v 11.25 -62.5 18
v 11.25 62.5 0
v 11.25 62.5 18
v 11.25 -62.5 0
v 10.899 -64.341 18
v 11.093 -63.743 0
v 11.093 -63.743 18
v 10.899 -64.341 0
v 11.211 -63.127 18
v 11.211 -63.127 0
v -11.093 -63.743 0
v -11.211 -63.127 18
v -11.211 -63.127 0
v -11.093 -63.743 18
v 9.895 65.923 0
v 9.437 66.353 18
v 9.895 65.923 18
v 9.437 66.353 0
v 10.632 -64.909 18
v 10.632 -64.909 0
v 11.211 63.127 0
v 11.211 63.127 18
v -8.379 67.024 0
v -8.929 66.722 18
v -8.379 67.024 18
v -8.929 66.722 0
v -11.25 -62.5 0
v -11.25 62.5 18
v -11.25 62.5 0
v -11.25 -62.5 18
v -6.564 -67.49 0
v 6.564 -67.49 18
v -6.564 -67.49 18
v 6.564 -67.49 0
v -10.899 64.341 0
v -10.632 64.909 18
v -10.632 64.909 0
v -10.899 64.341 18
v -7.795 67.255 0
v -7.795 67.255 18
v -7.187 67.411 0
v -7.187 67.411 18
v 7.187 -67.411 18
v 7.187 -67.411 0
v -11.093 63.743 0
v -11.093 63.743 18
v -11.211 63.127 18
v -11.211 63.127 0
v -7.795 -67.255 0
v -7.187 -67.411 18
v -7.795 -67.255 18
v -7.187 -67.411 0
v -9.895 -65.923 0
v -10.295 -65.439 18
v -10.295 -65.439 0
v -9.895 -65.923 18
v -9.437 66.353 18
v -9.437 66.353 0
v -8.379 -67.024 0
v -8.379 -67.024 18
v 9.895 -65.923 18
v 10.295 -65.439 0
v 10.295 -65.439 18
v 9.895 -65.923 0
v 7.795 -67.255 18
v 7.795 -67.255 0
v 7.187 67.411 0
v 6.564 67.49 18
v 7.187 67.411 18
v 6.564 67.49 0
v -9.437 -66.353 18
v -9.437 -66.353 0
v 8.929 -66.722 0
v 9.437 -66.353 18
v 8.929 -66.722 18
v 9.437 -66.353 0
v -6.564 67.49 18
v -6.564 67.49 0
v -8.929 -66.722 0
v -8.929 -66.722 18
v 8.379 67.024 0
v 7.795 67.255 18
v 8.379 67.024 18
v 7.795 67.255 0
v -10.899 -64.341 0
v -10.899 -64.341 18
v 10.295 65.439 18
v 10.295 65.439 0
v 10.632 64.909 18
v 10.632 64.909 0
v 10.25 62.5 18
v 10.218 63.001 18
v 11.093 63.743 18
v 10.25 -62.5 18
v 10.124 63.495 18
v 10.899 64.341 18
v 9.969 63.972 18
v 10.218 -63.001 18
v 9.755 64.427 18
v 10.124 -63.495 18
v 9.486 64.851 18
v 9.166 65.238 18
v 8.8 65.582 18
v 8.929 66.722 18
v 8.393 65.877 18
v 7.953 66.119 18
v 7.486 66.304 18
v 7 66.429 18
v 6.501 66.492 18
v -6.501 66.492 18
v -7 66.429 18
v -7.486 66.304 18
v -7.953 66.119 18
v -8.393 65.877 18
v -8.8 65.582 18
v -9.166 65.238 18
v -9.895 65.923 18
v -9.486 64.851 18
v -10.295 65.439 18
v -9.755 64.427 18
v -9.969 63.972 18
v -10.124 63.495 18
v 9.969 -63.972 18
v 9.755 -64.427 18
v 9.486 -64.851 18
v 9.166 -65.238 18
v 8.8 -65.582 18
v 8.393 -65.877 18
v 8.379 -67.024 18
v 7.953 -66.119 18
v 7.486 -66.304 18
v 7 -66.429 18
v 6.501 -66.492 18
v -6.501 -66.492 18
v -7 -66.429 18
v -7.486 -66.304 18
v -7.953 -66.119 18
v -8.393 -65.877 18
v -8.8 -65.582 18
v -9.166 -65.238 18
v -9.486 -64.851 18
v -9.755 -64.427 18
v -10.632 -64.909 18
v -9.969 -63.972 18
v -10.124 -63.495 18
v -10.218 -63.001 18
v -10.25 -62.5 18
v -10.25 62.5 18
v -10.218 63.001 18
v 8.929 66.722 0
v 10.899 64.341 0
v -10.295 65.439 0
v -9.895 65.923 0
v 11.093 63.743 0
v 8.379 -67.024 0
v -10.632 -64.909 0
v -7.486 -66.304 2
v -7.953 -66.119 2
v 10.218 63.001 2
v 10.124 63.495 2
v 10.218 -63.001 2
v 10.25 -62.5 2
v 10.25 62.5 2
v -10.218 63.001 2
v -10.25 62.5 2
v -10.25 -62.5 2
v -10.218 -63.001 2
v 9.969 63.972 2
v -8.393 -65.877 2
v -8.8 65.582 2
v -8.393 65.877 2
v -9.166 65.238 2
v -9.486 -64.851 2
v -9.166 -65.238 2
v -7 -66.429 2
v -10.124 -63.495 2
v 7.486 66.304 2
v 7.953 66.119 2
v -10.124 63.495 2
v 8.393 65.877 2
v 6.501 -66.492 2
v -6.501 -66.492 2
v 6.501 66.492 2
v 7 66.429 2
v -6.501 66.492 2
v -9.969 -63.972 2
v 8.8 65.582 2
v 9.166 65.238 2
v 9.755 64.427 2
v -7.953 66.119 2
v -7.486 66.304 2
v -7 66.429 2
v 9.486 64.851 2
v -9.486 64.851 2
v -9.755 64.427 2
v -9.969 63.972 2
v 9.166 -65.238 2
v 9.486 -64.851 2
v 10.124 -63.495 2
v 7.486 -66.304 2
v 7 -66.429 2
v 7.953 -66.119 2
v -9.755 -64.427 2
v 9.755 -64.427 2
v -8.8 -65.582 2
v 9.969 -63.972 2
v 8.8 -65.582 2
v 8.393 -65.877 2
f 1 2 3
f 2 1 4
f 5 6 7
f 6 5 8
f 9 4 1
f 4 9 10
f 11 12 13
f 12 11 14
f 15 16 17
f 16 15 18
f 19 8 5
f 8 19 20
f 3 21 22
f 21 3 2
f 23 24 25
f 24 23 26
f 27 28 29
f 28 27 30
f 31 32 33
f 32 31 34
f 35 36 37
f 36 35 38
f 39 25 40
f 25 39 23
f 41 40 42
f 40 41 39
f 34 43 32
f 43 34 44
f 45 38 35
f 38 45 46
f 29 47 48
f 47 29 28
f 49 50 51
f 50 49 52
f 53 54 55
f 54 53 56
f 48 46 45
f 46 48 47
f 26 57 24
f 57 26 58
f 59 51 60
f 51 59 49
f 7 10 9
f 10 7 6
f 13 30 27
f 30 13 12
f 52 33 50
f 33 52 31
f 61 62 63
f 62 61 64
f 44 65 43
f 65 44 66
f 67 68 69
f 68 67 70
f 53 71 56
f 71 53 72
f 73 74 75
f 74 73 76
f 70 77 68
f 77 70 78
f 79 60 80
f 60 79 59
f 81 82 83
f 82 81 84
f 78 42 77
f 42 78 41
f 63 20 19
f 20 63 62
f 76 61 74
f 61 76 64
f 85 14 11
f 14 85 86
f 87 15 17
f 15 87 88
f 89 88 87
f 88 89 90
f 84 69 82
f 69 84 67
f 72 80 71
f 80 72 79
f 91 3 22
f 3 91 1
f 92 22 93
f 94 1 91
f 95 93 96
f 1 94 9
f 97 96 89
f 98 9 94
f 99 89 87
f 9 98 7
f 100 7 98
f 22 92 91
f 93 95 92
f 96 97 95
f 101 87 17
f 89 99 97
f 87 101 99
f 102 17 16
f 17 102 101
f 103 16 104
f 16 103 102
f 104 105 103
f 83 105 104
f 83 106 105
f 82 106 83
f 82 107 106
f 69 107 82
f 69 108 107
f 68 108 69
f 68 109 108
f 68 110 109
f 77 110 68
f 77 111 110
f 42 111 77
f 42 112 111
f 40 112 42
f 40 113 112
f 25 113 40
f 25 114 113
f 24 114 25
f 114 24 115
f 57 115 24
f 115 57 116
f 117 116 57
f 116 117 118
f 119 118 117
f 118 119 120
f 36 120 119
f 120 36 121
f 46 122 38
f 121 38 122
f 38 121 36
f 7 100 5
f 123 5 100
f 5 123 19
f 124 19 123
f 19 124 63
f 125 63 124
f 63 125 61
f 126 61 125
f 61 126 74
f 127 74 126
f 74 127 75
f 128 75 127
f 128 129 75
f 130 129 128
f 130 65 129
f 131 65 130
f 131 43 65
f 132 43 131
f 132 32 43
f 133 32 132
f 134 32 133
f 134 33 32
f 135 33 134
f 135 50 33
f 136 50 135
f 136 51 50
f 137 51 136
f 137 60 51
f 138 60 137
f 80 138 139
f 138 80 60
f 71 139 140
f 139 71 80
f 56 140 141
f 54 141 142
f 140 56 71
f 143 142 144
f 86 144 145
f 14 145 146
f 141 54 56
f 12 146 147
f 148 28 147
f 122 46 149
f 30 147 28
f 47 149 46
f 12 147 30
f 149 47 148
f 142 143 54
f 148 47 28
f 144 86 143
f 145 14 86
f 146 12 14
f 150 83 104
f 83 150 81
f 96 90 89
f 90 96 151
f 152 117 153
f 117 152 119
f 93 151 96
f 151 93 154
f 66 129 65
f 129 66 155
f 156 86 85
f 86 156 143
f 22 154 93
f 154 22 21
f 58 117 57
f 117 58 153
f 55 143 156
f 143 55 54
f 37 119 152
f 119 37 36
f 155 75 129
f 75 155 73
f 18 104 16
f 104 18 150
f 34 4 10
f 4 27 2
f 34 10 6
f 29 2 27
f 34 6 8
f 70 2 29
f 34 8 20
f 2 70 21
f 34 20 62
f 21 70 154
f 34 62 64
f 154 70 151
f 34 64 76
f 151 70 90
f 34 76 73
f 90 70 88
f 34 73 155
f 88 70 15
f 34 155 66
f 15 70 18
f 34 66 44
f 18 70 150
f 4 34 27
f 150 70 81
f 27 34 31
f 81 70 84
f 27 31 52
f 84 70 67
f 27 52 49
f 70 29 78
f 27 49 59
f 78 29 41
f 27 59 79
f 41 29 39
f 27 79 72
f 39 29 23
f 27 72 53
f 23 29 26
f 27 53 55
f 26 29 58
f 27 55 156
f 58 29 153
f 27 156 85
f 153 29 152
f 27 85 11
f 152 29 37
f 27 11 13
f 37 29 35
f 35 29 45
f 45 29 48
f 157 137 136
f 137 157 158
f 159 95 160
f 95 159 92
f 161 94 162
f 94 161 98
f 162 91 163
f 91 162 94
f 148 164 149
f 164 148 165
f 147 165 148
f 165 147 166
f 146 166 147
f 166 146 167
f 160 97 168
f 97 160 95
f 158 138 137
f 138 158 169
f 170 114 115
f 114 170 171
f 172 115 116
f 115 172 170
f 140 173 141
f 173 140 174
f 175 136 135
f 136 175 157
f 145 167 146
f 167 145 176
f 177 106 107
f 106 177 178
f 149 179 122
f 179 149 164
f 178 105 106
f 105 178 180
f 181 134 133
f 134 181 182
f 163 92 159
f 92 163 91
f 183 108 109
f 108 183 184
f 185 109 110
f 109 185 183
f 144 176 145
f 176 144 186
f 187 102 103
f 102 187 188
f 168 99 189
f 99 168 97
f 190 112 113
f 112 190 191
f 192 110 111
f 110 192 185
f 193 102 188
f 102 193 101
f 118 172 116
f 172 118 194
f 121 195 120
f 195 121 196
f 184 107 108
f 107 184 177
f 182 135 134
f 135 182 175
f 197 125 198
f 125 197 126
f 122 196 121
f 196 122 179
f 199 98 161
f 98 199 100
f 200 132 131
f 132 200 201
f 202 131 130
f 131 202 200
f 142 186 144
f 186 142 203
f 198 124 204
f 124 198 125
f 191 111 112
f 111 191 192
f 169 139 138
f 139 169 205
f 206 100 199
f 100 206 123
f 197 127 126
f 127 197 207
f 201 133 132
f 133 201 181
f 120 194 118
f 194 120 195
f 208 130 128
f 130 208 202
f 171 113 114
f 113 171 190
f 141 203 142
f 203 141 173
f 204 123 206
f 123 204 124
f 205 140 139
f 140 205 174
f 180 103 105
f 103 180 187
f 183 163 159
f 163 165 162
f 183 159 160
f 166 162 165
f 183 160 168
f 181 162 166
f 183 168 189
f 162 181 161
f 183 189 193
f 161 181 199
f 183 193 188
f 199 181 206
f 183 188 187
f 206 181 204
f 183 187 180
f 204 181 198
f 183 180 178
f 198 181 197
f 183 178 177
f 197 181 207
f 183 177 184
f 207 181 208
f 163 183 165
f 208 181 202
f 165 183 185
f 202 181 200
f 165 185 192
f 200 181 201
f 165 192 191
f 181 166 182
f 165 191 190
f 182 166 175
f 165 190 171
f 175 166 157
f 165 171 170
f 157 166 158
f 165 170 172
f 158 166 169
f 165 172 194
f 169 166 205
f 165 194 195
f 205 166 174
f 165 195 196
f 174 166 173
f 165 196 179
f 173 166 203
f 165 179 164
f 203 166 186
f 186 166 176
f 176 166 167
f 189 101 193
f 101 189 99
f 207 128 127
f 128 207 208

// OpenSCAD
$fn = 50;


difference() {
	union() {
		hull() {
			translate(v = [-6.2500000000, 62.5000000000, 0]) {
				cylinder(h = 18, r = 5);
			}
			translate(v = [6.2500000000, 62.5000000000, 0]) {
				cylinder(h = 18, r = 5);
			}
			translate(v = [-6.2500000000, -62.5000000000, 0]) {
				cylinder(h = 18, r = 5);
			}
			translate(v = [6.2500000000, -62.5000000000, 0]) {
				cylinder(h = 18, r = 5);
			}
		}
	}
	union() {
		translate(v = [0, 0, 2]) {
			hull() {
				translate(v = [-6.2500000000, 62.5000000000, 0]) {
					cylinder(h = 16, r = 4);
				}
				translate(v = [6.2500000000, 62.5000000000, 0]) {
					cylinder(h = 16, r = 4);
				}
				translate(v = [-6.2500000000, -62.5000000000, 0]) {
					cylinder(h = 16, r = 4);
				}
				translate(v = [6.2500000000, -62.5000000000, 0]) {
					cylinder(h = 16, r = 4);
				}
			}
		}
	}
}
